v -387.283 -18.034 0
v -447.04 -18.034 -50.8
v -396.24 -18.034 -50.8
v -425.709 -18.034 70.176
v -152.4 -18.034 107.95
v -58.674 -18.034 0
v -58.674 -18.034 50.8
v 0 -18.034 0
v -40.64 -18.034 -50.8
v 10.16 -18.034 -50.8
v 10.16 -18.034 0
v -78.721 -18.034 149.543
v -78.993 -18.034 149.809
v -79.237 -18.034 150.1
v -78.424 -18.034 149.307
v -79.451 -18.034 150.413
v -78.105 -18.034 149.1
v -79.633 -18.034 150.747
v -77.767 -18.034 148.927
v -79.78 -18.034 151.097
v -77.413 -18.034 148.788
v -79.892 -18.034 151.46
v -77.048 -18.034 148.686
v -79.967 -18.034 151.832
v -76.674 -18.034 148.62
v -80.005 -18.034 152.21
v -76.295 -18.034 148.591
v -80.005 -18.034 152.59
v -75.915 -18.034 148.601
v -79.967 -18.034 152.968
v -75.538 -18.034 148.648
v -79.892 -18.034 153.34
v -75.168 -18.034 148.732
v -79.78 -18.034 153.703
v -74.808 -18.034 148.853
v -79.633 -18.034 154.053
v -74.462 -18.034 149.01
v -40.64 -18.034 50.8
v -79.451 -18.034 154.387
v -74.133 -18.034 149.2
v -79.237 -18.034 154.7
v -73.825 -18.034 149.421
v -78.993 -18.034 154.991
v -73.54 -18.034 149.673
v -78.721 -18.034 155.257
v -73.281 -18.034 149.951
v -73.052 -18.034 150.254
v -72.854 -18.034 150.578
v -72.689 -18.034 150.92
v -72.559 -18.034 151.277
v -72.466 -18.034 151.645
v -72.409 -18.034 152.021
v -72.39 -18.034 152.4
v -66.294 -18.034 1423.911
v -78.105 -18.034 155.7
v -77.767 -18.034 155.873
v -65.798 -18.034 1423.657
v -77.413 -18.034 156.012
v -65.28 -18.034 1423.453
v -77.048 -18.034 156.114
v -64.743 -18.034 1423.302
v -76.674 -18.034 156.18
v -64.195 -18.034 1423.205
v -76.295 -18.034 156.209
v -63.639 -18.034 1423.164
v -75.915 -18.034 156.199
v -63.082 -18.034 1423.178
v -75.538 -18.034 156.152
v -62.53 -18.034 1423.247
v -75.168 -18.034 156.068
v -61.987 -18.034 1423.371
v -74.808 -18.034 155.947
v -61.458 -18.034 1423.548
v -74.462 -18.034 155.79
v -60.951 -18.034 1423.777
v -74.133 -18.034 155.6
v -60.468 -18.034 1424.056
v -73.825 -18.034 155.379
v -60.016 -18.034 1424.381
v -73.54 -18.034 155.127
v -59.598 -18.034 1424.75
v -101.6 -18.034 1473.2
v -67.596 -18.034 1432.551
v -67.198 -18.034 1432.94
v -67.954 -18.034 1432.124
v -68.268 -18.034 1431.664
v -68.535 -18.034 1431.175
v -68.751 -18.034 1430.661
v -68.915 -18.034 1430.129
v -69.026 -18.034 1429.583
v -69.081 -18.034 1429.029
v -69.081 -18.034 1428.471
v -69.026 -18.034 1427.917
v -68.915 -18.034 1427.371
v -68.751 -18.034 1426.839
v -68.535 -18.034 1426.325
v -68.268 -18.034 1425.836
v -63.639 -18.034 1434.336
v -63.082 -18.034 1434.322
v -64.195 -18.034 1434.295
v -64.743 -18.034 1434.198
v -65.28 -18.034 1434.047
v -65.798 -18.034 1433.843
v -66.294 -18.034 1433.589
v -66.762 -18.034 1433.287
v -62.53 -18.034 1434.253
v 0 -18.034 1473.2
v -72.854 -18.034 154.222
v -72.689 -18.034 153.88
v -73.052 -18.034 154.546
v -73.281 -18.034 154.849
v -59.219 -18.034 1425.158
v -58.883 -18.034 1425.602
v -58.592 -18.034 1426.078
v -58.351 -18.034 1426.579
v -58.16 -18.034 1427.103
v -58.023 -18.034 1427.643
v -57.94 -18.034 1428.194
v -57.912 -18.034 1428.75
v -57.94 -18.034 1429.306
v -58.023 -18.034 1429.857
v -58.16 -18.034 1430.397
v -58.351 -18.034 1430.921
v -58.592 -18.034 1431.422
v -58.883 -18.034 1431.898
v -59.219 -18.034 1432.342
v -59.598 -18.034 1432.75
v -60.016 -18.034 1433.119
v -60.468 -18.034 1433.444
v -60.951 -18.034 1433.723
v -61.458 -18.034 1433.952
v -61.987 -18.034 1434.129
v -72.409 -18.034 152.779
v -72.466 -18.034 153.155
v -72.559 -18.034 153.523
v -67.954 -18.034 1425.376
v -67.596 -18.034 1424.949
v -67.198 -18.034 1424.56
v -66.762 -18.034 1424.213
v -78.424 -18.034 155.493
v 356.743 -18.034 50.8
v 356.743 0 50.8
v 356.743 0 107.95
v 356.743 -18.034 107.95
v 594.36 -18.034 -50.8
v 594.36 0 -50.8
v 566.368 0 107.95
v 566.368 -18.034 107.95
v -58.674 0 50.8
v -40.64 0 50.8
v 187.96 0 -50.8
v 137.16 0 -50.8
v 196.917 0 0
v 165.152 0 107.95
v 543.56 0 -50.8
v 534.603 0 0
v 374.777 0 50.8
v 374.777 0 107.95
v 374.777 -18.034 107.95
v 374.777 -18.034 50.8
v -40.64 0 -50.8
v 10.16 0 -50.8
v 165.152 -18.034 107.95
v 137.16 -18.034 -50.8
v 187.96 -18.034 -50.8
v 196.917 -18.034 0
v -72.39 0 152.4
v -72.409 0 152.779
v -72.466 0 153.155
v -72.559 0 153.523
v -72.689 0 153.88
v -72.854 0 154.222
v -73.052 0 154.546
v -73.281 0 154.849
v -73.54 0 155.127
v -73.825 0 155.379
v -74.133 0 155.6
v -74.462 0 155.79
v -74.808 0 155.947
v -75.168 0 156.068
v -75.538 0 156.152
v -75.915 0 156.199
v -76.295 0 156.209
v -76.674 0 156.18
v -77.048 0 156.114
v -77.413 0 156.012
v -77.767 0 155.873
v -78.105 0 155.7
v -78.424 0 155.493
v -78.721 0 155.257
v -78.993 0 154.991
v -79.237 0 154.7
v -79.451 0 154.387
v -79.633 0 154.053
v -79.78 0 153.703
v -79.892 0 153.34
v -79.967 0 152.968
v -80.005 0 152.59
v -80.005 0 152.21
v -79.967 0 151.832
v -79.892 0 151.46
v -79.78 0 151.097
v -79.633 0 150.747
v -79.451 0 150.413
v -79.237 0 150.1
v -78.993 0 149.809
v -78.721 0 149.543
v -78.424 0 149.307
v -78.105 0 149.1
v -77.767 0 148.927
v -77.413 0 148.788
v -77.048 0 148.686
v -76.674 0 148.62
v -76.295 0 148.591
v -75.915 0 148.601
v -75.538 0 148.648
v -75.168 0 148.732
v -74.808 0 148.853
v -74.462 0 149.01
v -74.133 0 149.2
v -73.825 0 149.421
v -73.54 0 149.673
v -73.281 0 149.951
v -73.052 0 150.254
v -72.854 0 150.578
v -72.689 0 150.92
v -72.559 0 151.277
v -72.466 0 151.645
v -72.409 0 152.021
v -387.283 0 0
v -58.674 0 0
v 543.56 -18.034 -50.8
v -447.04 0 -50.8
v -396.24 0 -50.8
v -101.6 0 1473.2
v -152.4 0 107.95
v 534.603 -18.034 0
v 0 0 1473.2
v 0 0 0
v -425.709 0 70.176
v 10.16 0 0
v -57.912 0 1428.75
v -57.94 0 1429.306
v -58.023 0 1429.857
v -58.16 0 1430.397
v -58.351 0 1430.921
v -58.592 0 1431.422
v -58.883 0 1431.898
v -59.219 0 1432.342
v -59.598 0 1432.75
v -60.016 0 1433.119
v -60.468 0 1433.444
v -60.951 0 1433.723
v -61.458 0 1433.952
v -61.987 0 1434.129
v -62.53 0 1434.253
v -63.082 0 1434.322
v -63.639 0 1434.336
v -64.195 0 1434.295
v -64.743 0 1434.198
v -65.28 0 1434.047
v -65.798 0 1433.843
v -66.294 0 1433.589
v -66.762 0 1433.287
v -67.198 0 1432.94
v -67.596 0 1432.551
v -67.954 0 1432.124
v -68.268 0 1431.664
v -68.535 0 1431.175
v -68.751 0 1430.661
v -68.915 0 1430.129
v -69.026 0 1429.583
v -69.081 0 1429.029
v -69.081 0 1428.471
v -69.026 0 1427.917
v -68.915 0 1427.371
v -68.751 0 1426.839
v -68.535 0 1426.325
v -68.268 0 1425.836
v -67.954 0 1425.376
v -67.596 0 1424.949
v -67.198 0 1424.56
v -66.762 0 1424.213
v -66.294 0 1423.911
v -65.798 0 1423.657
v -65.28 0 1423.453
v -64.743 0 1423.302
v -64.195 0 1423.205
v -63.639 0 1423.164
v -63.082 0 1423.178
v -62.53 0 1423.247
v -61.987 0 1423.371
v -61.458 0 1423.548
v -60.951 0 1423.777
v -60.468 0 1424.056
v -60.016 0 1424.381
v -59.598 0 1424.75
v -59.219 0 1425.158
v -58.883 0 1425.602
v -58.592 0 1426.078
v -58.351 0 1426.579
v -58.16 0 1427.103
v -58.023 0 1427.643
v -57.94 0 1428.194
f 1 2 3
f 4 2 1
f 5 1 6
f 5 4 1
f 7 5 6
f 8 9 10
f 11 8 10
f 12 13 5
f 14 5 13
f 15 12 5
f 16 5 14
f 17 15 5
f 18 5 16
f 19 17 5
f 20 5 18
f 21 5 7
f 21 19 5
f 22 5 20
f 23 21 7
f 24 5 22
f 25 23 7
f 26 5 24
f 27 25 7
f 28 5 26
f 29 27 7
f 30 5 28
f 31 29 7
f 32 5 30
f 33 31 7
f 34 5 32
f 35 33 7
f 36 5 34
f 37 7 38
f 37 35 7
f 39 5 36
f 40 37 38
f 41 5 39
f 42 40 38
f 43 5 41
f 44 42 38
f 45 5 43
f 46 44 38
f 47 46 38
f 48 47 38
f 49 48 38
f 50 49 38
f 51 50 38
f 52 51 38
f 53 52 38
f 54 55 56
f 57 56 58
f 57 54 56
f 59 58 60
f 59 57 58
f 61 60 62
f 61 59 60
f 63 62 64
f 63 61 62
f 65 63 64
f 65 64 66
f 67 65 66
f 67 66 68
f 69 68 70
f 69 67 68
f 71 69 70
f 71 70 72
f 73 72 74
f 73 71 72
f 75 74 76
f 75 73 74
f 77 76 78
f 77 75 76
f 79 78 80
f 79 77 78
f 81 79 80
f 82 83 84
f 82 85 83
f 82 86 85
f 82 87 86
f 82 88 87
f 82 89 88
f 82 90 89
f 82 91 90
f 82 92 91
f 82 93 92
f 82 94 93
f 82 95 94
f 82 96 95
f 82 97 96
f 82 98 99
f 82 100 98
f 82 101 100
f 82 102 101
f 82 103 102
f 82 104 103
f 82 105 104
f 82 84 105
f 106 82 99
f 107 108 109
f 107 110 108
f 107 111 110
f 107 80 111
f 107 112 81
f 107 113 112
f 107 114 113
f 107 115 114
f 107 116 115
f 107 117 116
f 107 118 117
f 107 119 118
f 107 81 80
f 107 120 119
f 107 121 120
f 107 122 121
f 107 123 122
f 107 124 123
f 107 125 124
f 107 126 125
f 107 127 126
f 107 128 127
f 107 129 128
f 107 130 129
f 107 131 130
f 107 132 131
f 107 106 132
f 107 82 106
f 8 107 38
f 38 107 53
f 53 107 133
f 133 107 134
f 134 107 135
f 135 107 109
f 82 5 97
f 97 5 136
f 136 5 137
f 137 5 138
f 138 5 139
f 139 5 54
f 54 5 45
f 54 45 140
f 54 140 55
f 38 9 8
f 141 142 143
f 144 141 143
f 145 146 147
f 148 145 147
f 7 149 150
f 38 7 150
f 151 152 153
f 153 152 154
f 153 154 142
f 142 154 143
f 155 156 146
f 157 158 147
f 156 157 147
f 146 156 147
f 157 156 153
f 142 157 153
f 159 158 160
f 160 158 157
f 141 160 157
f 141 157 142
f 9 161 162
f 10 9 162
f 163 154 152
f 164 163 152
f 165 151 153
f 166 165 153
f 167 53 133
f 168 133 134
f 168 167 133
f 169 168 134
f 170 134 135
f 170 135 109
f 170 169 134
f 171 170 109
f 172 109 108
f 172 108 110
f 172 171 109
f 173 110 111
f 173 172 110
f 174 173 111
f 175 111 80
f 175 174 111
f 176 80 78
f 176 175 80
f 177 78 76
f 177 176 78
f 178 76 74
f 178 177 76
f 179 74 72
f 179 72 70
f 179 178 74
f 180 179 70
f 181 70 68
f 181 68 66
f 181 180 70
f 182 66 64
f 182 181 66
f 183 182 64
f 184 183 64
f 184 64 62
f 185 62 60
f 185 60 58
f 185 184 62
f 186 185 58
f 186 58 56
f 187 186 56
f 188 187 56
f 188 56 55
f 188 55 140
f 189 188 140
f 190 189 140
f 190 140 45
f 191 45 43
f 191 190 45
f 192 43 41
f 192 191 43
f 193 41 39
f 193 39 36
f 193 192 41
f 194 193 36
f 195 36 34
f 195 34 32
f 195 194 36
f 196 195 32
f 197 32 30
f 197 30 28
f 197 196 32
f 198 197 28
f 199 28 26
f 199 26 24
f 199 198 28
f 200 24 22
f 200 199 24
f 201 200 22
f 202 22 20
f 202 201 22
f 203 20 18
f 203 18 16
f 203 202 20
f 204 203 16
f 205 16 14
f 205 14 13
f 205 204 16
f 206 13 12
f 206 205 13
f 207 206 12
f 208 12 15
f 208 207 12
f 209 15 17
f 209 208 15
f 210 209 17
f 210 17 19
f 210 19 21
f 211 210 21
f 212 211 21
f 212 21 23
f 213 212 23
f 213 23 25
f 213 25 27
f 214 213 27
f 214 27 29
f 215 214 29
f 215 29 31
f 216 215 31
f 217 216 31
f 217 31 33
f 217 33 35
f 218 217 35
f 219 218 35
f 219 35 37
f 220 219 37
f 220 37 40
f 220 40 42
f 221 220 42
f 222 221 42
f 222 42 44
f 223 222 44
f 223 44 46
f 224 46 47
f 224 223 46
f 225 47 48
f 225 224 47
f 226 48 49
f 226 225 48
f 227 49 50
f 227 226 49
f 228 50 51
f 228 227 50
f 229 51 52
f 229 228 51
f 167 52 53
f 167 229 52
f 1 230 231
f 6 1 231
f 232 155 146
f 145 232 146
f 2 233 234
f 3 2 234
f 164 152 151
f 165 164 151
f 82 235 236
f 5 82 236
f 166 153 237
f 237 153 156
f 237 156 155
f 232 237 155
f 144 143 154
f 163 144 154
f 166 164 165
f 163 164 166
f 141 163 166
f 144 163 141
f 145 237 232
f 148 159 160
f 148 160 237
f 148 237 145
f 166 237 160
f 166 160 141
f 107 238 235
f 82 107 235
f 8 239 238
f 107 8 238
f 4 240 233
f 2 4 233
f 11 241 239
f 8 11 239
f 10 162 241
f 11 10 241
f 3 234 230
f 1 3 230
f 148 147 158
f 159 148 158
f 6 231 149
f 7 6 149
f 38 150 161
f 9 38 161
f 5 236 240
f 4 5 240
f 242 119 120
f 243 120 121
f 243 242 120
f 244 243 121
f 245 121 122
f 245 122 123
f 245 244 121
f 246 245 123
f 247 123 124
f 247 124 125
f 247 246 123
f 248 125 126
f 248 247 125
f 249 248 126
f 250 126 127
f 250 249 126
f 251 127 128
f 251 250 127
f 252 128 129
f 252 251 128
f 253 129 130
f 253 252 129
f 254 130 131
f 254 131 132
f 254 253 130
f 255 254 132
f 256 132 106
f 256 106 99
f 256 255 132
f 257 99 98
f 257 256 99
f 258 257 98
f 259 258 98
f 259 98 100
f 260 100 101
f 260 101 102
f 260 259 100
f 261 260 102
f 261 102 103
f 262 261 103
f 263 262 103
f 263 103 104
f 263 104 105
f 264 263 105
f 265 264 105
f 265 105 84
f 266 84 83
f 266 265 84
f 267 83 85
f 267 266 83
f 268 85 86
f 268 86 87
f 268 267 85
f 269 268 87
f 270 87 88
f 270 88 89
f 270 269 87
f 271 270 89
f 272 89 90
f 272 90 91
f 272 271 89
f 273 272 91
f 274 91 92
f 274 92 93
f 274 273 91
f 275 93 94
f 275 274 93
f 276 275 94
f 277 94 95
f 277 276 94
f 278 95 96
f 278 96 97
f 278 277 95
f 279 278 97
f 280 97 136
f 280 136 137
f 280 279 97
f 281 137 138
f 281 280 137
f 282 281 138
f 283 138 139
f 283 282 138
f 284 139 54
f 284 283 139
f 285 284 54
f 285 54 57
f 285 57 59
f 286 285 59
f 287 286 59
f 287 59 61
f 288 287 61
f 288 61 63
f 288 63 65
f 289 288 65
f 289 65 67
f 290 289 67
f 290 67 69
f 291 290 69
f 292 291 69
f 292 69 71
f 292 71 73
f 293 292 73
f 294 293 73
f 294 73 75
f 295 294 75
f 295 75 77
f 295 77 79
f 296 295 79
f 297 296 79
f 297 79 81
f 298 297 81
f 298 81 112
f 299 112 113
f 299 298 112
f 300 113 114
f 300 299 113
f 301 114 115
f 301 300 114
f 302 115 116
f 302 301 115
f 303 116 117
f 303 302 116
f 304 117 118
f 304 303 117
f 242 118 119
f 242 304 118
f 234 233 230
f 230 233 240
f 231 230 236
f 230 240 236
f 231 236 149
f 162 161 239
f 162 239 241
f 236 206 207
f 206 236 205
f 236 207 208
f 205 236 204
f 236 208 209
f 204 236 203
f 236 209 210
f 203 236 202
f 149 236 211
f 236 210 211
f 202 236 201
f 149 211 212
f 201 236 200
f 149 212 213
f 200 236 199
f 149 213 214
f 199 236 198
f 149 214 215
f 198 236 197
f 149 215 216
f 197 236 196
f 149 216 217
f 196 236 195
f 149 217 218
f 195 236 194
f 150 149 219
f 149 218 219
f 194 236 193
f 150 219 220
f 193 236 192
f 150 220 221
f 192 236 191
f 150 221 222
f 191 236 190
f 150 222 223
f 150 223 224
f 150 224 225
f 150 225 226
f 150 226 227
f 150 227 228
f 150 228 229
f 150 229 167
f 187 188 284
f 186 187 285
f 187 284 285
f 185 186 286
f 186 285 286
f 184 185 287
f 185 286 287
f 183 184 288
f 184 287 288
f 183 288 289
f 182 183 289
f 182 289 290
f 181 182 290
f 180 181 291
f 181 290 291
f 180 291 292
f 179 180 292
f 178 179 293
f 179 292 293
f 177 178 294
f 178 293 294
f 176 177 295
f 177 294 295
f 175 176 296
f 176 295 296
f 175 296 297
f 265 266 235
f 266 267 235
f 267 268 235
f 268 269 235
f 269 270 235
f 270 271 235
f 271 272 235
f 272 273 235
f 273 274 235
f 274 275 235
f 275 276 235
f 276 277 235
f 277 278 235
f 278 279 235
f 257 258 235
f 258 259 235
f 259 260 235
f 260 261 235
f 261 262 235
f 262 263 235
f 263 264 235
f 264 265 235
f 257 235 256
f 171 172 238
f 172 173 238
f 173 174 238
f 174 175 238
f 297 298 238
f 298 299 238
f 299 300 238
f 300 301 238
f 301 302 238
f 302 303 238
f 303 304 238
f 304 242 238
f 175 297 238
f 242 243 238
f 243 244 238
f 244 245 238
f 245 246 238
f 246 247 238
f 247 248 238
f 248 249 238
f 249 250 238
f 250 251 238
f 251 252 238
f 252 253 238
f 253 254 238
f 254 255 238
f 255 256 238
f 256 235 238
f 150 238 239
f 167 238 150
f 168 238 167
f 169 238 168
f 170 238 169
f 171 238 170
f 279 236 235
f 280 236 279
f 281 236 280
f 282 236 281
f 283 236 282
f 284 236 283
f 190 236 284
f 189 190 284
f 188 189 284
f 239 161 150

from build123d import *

# Parameters (mm, degrees)
F0_R     = 3.81
F0_R_2   = 5.588
F1_DEPTH = 18.034


with BuildPart() as f1:
    # F0 (on Front) → F1 (new body)
    with BuildSketch(Plane.XZ):
        Polygon((10.16, 0), (0, 0), (0, 1473.2), (-101.6, 1473.2), (-152.4, 107.95), (-425.708709, 70.175764), (-447.04, -50.8), (-396.24, -50.8), (-387.282589, 0), (-58.674, 0), (-58.674, 50.8), (-40.64, 50.8), (-40.64, -50.8), (10.16, -50.8), align=None)
        with Locations((-76.2, 152.4)):
            Circle(F0_R, mode=Mode.SUBTRACT)
        with Locations((-63.5, 1428.75)):
            Circle(F0_R_2, mode=Mode.SUBTRACT)
        Polygon((165.151908, 107.95), (137.16, -50.8), (187.96, -50.8), (196.917411, 0), (534.602589, 0), (543.56, -50.8), (594.36, -50.8), (566.368092, 107.95), (374.777, 107.95), (374.777, 50.8), (356.743, 50.8), (356.743, 107.95), align=None)
    extrude(amount=F1_DEPTH)


solid = f1.part
